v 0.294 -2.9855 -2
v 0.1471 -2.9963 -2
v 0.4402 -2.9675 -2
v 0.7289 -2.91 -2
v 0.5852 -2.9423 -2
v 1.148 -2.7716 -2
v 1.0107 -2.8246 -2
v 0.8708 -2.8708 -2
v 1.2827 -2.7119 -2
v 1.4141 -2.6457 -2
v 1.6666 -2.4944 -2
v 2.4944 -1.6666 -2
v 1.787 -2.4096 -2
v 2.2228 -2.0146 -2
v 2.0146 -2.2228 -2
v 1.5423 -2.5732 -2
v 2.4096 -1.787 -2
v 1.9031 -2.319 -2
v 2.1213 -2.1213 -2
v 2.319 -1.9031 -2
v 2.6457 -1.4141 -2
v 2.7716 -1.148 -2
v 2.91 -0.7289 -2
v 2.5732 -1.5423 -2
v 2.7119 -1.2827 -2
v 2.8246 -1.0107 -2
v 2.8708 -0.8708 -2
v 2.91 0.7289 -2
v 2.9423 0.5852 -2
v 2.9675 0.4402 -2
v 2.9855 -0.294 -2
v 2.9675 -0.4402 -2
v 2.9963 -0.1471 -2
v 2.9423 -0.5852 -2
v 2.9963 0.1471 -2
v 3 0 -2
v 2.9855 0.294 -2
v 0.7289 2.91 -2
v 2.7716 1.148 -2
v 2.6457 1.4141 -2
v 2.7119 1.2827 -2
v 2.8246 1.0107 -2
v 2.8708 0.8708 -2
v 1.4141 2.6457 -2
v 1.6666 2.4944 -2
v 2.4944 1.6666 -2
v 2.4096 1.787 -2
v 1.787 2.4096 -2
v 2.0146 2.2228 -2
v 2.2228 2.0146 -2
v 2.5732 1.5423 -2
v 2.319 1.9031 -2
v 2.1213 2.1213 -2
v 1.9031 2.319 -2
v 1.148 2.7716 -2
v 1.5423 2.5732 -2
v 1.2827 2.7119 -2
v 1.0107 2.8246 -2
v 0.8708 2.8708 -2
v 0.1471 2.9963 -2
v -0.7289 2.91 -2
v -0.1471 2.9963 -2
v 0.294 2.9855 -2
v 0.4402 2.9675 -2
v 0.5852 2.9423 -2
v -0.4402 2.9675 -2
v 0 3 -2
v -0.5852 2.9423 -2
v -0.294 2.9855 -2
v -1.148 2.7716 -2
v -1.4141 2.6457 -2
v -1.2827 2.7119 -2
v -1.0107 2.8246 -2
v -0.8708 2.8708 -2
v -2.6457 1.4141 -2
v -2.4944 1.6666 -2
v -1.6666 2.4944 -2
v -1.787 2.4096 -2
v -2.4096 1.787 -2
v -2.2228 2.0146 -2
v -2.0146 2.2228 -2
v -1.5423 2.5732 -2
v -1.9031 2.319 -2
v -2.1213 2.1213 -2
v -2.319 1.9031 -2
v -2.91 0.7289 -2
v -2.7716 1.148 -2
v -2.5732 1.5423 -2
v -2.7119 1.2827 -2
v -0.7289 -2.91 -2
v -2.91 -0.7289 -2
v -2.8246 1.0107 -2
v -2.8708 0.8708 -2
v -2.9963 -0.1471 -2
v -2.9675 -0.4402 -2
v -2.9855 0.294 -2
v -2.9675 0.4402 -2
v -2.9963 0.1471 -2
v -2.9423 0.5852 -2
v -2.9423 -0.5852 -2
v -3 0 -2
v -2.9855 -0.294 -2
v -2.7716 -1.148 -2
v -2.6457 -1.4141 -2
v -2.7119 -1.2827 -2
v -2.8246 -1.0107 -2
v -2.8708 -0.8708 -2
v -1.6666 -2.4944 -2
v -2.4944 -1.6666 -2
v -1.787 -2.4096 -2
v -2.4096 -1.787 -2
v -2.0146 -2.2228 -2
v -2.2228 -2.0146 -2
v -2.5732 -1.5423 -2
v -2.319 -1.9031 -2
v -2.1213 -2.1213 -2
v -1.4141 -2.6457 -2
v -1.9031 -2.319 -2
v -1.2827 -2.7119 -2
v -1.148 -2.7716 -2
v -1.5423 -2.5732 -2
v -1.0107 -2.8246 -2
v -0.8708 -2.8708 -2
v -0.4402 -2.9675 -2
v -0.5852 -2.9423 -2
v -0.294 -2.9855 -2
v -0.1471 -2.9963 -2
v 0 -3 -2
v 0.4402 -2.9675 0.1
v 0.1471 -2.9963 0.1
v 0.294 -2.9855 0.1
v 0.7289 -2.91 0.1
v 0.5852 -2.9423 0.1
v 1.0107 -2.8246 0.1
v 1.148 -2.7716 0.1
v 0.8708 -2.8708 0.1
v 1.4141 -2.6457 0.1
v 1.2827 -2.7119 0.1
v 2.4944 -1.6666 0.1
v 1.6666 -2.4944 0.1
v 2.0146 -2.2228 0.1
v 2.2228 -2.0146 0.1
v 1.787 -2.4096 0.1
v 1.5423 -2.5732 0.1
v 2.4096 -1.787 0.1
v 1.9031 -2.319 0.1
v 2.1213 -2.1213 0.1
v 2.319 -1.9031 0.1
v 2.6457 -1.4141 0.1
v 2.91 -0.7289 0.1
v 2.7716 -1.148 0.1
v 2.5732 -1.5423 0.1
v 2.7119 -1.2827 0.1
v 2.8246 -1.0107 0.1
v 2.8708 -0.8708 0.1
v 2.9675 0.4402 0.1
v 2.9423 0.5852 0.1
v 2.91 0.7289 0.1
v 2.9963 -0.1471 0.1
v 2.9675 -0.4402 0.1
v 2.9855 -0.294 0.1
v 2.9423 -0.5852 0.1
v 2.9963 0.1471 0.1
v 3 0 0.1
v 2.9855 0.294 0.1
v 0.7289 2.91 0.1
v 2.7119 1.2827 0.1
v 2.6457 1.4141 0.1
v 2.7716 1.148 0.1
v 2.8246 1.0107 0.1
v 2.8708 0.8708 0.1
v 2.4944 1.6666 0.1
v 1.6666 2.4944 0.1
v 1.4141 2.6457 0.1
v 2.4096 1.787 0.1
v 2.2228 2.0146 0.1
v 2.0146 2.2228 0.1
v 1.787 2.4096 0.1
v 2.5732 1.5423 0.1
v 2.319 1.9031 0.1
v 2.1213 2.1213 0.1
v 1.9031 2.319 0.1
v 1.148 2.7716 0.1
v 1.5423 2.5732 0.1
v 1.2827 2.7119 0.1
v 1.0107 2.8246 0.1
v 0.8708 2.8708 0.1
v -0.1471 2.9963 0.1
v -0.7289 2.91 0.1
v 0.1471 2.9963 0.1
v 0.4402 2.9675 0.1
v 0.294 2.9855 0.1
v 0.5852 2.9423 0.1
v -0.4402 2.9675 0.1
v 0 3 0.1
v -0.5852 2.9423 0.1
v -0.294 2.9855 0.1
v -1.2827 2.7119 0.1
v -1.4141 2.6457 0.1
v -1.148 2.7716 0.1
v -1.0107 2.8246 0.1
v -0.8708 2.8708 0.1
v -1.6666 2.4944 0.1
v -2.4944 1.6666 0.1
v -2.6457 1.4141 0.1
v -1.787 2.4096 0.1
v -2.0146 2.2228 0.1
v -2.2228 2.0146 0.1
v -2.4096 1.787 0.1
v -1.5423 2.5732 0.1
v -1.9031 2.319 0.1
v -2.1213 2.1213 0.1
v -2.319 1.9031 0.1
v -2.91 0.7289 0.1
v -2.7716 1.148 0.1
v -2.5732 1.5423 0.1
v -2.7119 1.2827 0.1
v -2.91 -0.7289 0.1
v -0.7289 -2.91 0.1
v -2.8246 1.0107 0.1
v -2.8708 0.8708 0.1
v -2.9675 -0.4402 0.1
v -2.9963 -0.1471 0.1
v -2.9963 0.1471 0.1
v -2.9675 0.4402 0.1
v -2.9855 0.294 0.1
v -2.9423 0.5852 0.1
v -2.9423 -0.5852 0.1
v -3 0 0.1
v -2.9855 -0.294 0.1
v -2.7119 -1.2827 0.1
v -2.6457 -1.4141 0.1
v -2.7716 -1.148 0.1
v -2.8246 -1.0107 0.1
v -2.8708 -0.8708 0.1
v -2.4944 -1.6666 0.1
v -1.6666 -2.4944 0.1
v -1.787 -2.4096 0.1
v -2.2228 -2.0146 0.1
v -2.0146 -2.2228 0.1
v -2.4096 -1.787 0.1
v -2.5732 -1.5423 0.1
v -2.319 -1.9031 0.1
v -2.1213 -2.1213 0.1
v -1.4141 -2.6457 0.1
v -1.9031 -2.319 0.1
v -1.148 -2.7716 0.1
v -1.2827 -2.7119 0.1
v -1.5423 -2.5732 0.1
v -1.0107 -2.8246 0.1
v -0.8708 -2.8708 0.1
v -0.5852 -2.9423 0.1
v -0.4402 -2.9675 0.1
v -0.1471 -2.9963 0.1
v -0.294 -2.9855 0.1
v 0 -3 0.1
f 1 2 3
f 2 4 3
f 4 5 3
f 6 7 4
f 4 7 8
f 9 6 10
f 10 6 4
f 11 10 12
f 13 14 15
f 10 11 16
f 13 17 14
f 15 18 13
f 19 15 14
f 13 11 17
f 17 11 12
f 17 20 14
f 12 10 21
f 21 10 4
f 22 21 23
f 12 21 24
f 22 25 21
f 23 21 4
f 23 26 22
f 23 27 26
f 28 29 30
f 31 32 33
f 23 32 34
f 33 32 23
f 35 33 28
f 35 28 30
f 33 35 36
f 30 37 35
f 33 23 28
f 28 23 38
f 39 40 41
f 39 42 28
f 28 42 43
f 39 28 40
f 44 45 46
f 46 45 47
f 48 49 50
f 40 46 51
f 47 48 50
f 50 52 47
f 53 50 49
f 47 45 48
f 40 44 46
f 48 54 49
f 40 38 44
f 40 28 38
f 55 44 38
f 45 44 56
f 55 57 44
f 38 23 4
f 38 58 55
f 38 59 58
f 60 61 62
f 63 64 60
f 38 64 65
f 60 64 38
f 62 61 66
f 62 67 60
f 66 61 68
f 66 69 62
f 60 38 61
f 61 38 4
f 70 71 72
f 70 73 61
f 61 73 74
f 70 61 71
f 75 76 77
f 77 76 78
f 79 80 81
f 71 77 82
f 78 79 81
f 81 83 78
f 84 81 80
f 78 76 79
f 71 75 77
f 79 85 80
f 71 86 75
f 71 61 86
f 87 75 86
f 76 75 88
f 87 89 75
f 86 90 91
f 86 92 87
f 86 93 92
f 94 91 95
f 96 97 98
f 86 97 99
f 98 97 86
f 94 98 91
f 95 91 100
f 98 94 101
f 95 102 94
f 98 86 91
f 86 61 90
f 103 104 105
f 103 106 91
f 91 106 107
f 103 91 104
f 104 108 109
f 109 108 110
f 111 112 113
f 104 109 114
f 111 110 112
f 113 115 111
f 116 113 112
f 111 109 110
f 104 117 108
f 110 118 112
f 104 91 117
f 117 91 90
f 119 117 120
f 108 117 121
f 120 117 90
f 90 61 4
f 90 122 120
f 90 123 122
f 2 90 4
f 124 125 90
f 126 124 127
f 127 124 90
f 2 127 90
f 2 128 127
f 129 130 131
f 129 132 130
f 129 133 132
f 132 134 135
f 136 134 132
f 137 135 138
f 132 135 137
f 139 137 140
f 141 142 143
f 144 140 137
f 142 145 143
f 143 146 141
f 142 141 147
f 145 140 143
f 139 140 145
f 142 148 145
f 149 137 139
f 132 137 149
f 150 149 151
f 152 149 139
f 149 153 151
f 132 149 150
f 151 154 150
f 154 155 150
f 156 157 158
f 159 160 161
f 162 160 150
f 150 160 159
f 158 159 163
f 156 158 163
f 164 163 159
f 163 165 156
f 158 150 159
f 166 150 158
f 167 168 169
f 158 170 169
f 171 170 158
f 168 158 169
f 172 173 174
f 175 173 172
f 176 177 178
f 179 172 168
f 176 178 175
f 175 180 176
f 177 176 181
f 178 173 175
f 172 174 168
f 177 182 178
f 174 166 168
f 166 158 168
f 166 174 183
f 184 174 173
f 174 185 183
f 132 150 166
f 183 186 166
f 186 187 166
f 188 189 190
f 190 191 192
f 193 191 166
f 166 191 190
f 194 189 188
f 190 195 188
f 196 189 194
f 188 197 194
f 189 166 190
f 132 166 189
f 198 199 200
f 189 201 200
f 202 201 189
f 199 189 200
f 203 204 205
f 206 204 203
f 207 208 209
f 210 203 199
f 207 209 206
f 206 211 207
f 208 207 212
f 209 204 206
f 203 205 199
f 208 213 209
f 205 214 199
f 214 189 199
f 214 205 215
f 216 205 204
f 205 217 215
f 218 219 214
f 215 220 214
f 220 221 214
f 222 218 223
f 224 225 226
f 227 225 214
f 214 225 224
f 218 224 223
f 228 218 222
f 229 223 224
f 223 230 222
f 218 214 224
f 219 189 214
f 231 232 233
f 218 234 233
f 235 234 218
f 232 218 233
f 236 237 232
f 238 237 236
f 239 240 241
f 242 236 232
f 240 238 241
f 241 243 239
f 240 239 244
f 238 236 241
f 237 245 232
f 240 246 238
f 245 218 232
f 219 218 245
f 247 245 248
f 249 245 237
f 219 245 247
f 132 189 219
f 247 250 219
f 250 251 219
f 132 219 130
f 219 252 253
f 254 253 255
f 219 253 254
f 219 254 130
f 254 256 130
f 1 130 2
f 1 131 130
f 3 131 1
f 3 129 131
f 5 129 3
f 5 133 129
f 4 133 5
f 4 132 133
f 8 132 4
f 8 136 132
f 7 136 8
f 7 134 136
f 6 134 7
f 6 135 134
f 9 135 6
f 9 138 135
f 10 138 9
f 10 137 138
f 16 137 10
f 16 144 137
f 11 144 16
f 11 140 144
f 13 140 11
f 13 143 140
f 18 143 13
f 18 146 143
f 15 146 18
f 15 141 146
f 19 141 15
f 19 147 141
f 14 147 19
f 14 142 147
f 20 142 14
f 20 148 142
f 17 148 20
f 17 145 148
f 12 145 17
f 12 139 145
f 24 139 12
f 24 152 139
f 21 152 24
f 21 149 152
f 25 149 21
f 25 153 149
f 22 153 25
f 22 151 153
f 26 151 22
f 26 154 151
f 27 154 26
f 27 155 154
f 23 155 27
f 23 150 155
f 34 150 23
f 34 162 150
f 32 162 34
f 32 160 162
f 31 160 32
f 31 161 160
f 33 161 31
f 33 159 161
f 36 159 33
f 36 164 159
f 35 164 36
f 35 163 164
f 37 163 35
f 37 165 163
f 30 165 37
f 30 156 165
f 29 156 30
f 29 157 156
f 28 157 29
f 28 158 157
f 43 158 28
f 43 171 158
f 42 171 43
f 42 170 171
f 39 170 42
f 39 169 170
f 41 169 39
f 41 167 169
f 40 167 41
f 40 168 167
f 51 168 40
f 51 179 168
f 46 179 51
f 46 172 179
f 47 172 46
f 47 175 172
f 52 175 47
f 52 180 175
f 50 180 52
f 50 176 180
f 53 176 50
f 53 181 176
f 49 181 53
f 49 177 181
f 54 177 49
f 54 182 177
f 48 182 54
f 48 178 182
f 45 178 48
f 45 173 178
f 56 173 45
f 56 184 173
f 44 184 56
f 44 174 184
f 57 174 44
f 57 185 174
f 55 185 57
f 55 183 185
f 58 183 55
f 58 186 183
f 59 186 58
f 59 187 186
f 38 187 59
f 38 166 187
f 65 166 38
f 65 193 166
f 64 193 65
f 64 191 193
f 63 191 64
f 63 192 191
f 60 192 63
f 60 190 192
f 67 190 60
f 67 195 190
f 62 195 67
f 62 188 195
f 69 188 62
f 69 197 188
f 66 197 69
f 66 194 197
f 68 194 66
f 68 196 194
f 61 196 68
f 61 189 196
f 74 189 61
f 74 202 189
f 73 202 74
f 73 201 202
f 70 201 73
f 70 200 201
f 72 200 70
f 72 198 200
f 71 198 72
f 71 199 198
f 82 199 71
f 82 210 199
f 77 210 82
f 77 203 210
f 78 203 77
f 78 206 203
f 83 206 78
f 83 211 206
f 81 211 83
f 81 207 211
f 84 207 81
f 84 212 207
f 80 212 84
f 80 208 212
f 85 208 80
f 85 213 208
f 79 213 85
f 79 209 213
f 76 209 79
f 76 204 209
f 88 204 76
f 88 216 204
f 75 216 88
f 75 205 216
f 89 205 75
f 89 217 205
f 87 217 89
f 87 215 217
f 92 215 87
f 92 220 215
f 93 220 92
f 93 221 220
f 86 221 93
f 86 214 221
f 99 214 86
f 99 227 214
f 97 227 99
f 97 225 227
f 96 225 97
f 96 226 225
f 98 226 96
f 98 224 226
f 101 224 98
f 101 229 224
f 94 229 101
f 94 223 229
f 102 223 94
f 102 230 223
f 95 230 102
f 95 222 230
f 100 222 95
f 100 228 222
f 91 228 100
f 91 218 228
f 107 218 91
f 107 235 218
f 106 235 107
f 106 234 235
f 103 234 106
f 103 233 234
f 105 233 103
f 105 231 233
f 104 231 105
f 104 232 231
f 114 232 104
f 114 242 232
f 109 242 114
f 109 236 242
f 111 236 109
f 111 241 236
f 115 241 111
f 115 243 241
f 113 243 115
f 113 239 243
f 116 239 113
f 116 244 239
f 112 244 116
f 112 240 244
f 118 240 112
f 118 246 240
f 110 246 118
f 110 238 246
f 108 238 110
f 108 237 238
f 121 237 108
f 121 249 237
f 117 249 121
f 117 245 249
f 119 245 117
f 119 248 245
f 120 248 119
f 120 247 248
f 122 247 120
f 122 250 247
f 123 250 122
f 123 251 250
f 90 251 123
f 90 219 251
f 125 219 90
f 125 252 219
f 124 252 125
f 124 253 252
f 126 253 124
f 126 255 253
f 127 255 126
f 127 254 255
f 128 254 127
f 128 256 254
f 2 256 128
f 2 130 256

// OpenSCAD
translate([0.0, 0.0, -2.0])
{
    linear_extrude(height = 2.1, twist = 0.0, scale = 1.0, slices = 1, center = false)
    {
        scale([6.0, 6.0])
        {
            M196();
        }
    }
}

module M196()
{
    polygon
    (
        points =
        [
            [0.5, 0.0], 
            [0.4993977281025862, 0.024533837163709007], 
            [0.49759236333609846, 0.0490085701647803], 
            [0.4945882549823905, 0.07336523722768087], 
            [0.4903926402016152, 0.09754516100806412], 
            [0.485015626597272, 0.12149008995163194], 
            [0.4784701678661044, 0.14514233862723117], 
            [0.4707720325915104, 0.16844492669611003], 
            [0.46193976625564337, 0.1913417161825449], 
            [0.45199464656172167, 0.21377754671514104], 
            [0.4409606321741775, 0.23569836841299882], 
            [0.42886430500013606, 0.25705137209661083], 
            [0.4157348061512726, 0.2777851165098011], 
            [0.40160376574032247, 0.2978496522462167], 
            [0.3865052266813685, 0.31719664208182274], 
            [0.37047556267747955, 0.33577947742350917], 
            [0.3535533905932738, 0.35355339059327373], 
            [0.33577947742350917, 0.37047556267747955], 
            [0.31719664208182274, 0.3865052266813685], 
            [0.29784965224621673, 0.4016037657403224], 
            [0.27778511650980114, 0.4157348061512726], 
            [0.25705137209661083, 0.42886430500013606], 
            [0.2356983684129989, 0.44096063217417747], 
            [0.2137775467151411, 0.45199464656172167], 
            [0.19134171618254492, 0.46193976625564337], 
            [0.16844492669611003, 0.4707720325915104], 
            [0.14514233862723117, 0.47847016786610447], 
            [0.12149008995163199, 0.485015626597272], 
            [0.09754516100806417, 0.4903926402016152], 
            [0.07336523722768087, 0.4945882549823905], 
            [0.049008570164780385, 0.4975923633360984], 
            [0.024533837163709063, 0.4993977281025862], 
            [3.061616997868383E-17, 0.5], 
            [-0.024533837163709004, 0.4993977281025862], 
            [-0.04900857016478032, 0.49759236333609846], 
            [-0.07336523722768082, 0.4945882549823905], 
            [-0.0975451610080641, 0.4903926402016152], 
            [-0.12149008995163194, 0.485015626597272], 
            [-0.14514233862723108, 0.47847016786610447], 
            [-0.16844492669610997, 0.4707720325915104], 
            [-0.19134171618254486, 0.46193976625564337], 
            [-0.21377754671514093, 0.4519946465617217], 
            [-0.23569836841299885, 0.4409606321741775], 
            [-0.25705137209661083, 0.42886430500013606], 
            [-0.277785116509801, 0.41573480615127273], 
            [-0.2978496522462167, 0.40160376574032247], 
            [-0.3171966420818227, 0.38650522668136855], 
            [-0.3357794774235092, 0.3704755626774795], 
            [-0.35355339059327373, 0.3535533905932738], 
            [-0.37047556267747944, 0.3357794774235093], 
            [-0.3865052266813685, 0.31719664208182274], 
            [-0.4016037657403224, 0.29784965224621673], 
            [-0.4157348061512727, 0.2777851165098011], 
            [-0.428864305000136, 0.2570513720966109], 
            [-0.44096063217417747, 0.23569836841299893], 
            [-0.45199464656172167, 0.21377754671514101], 
            [-0.46193976625564337, 0.19134171618254495], 
            [-0.47077203259151035, 0.16844492669611016], 
            [-0.4784701678661044, 0.1451423386272312], 
            [-0.485015626597272, 0.12149008995163203], 
            [-0.4903926402016152, 0.0975451610080643], 
            [-0.4945882549823905, 0.0733652372276809], 
            [-0.4975923633360984, 0.04900857016478041], 
            [-0.4993977281025862, 0.024533837163708983], 
            [-0.5, 6.123233995736766E-17], 
            [-0.4993977281025862, -0.024533837163708862], 
            [-0.49759236333609846, -0.049008570164780295], 
            [-0.4945882549823905, -0.07336523722768079], 
            [-0.4903926402016152, -0.09754516100806418], 
            [-0.485015626597272, -0.12149008995163191], 
            [-0.47847016786610447, -0.14514233862723105], 
            [-0.4707720325915104, -0.16844492669611005], 
            [-0.4619397662556434, -0.19134171618254484], 
            [-0.4519946465617217, -0.2137775467151409], 
            [-0.4409606321741775, -0.23569836841299882], 
            [-0.42886430500013606, -0.2570513720966108], 
            [-0.41573480615127273, -0.277785116509801], 
            [-0.40160376574032247, -0.2978496522462166], 
            [-0.38650522668136855, -0.31719664208182263], 
            [-0.37047556267747955, -0.3357794774235092], 
            [-0.35355339059327384, -0.35355339059327373], 
            [-0.33577947742350933, -0.37047556267747944], 
            [-0.31719664208182297, -0.38650522668136833], 
            [-0.29784965224621657, -0.4016037657403225], 
            [-0.2777851165098011, -0.4157348061512726], 
            [-0.2570513720966109, -0.428864305000136], 
            [-0.23569836841299893, -0.44096063217417747], 
            [-0.21377754671514124, -0.45199464656172156], 
            [-0.19134171618254517, -0.46193976625564326], 
            [-0.16844492669610997, -0.4707720325915104], 
            [-0.14514233862723122, -0.4784701678661044], 
            [-0.12149008995163206, -0.485015626597272], 
            [-0.09754516100806433, -0.49039264020161516], 
            [-0.07336523722768115, -0.49458825498239045], 
            [-0.049008570164780225, -0.49759236333609846], 
            [-0.024533837163709014, -0.4993977281025862], 
            [-9.184850993605148E-17, -0.5], 
            [0.02453383716370883, -0.4993977281025862], 
            [0.049008570164780045, -0.49759236333609846], 
            [0.07336523722768097, -0.49458825498239045], 
            [0.09754516100806415, -0.4903926402016152], 
            [0.12149008995163188, -0.485015626597272], 
            [0.14514233862723103, -0.47847016786610447], 
            [0.1684449266961098, -0.47077203259151046], 
            [0.191341716182545, -0.4619397662556433], 
            [0.21377754671514107, -0.45199464656172167], 
            [0.2356983684129988, -0.4409606321741775], 
            [0.2570513720966108, -0.4288643050001361], 
            [0.2777851165098009, -0.41573480615127273], 
            [0.29784965224621646, -0.40160376574032264], 
            [0.3171966420818228, -0.38650522668136844], 
            [0.33577947742350917, -0.37047556267747955], 
            [0.3535533905932737, -0.35355339059327384], 
            [0.37047556267747944, -0.33577947742350933], 
            [0.38650522668136833, -0.31719664208182297], 
            [0.4016037657403225, -0.2978496522462166], 
            [0.4157348061512726, -0.2777851165098011], 
            [0.428864305000136, -0.25705137209661094], 
            [0.4409606321741774, -0.23569836841299896], 
            [0.45199464656172156, -0.21377754671514126], 
            [0.46193976625564326, -0.1913417161825452], 
            [0.4707720325915104, -0.16844492669611], 
            [0.4784701678661044, -0.14514233862723125], 
            [0.485015626597272, -0.12149008995163209], 
            [0.49039264020161516, -0.09754516100806436], 
            [0.49458825498239045, -0.0733652372276812], 
            [0.49759236333609846, -0.04900857016478025], 
            [0.4993977281025862, -0.024533837163709046]
        ],
        paths =
        [
            [0, 1, 2, 3, 4, 5, 6, 7, 8, 9, 10, 11, 12, 13, 14, 15, 16, 17, 18, 19, 20, 21, 22, 23, 24, 25, 26, 27, 28, 29, 30, 31, 32, 33, 34, 35, 36, 37, 38, 39, 40, 41, 42, 43, 44, 45, 46, 47, 48, 49, 50, 51, 52, 53, 54, 55, 56, 57, 58, 59, 60, 61, 62, 63, 64, 65, 66, 67, 68, 69, 70, 71, 72, 73, 74, 75, 76, 77, 78, 79, 80, 81, 82, 83, 84, 85, 86, 87, 88, 89, 90, 91, 92, 93, 94, 95, 96, 97, 98, 99, 100, 101, 102, 103, 104, 105, 106, 107, 108, 109, 110, 111, 112, 113, 114, 115, 116, 117, 118, 119, 120, 121, 122, 123, 124, 125, 126, 127]
        ]
    );
}
